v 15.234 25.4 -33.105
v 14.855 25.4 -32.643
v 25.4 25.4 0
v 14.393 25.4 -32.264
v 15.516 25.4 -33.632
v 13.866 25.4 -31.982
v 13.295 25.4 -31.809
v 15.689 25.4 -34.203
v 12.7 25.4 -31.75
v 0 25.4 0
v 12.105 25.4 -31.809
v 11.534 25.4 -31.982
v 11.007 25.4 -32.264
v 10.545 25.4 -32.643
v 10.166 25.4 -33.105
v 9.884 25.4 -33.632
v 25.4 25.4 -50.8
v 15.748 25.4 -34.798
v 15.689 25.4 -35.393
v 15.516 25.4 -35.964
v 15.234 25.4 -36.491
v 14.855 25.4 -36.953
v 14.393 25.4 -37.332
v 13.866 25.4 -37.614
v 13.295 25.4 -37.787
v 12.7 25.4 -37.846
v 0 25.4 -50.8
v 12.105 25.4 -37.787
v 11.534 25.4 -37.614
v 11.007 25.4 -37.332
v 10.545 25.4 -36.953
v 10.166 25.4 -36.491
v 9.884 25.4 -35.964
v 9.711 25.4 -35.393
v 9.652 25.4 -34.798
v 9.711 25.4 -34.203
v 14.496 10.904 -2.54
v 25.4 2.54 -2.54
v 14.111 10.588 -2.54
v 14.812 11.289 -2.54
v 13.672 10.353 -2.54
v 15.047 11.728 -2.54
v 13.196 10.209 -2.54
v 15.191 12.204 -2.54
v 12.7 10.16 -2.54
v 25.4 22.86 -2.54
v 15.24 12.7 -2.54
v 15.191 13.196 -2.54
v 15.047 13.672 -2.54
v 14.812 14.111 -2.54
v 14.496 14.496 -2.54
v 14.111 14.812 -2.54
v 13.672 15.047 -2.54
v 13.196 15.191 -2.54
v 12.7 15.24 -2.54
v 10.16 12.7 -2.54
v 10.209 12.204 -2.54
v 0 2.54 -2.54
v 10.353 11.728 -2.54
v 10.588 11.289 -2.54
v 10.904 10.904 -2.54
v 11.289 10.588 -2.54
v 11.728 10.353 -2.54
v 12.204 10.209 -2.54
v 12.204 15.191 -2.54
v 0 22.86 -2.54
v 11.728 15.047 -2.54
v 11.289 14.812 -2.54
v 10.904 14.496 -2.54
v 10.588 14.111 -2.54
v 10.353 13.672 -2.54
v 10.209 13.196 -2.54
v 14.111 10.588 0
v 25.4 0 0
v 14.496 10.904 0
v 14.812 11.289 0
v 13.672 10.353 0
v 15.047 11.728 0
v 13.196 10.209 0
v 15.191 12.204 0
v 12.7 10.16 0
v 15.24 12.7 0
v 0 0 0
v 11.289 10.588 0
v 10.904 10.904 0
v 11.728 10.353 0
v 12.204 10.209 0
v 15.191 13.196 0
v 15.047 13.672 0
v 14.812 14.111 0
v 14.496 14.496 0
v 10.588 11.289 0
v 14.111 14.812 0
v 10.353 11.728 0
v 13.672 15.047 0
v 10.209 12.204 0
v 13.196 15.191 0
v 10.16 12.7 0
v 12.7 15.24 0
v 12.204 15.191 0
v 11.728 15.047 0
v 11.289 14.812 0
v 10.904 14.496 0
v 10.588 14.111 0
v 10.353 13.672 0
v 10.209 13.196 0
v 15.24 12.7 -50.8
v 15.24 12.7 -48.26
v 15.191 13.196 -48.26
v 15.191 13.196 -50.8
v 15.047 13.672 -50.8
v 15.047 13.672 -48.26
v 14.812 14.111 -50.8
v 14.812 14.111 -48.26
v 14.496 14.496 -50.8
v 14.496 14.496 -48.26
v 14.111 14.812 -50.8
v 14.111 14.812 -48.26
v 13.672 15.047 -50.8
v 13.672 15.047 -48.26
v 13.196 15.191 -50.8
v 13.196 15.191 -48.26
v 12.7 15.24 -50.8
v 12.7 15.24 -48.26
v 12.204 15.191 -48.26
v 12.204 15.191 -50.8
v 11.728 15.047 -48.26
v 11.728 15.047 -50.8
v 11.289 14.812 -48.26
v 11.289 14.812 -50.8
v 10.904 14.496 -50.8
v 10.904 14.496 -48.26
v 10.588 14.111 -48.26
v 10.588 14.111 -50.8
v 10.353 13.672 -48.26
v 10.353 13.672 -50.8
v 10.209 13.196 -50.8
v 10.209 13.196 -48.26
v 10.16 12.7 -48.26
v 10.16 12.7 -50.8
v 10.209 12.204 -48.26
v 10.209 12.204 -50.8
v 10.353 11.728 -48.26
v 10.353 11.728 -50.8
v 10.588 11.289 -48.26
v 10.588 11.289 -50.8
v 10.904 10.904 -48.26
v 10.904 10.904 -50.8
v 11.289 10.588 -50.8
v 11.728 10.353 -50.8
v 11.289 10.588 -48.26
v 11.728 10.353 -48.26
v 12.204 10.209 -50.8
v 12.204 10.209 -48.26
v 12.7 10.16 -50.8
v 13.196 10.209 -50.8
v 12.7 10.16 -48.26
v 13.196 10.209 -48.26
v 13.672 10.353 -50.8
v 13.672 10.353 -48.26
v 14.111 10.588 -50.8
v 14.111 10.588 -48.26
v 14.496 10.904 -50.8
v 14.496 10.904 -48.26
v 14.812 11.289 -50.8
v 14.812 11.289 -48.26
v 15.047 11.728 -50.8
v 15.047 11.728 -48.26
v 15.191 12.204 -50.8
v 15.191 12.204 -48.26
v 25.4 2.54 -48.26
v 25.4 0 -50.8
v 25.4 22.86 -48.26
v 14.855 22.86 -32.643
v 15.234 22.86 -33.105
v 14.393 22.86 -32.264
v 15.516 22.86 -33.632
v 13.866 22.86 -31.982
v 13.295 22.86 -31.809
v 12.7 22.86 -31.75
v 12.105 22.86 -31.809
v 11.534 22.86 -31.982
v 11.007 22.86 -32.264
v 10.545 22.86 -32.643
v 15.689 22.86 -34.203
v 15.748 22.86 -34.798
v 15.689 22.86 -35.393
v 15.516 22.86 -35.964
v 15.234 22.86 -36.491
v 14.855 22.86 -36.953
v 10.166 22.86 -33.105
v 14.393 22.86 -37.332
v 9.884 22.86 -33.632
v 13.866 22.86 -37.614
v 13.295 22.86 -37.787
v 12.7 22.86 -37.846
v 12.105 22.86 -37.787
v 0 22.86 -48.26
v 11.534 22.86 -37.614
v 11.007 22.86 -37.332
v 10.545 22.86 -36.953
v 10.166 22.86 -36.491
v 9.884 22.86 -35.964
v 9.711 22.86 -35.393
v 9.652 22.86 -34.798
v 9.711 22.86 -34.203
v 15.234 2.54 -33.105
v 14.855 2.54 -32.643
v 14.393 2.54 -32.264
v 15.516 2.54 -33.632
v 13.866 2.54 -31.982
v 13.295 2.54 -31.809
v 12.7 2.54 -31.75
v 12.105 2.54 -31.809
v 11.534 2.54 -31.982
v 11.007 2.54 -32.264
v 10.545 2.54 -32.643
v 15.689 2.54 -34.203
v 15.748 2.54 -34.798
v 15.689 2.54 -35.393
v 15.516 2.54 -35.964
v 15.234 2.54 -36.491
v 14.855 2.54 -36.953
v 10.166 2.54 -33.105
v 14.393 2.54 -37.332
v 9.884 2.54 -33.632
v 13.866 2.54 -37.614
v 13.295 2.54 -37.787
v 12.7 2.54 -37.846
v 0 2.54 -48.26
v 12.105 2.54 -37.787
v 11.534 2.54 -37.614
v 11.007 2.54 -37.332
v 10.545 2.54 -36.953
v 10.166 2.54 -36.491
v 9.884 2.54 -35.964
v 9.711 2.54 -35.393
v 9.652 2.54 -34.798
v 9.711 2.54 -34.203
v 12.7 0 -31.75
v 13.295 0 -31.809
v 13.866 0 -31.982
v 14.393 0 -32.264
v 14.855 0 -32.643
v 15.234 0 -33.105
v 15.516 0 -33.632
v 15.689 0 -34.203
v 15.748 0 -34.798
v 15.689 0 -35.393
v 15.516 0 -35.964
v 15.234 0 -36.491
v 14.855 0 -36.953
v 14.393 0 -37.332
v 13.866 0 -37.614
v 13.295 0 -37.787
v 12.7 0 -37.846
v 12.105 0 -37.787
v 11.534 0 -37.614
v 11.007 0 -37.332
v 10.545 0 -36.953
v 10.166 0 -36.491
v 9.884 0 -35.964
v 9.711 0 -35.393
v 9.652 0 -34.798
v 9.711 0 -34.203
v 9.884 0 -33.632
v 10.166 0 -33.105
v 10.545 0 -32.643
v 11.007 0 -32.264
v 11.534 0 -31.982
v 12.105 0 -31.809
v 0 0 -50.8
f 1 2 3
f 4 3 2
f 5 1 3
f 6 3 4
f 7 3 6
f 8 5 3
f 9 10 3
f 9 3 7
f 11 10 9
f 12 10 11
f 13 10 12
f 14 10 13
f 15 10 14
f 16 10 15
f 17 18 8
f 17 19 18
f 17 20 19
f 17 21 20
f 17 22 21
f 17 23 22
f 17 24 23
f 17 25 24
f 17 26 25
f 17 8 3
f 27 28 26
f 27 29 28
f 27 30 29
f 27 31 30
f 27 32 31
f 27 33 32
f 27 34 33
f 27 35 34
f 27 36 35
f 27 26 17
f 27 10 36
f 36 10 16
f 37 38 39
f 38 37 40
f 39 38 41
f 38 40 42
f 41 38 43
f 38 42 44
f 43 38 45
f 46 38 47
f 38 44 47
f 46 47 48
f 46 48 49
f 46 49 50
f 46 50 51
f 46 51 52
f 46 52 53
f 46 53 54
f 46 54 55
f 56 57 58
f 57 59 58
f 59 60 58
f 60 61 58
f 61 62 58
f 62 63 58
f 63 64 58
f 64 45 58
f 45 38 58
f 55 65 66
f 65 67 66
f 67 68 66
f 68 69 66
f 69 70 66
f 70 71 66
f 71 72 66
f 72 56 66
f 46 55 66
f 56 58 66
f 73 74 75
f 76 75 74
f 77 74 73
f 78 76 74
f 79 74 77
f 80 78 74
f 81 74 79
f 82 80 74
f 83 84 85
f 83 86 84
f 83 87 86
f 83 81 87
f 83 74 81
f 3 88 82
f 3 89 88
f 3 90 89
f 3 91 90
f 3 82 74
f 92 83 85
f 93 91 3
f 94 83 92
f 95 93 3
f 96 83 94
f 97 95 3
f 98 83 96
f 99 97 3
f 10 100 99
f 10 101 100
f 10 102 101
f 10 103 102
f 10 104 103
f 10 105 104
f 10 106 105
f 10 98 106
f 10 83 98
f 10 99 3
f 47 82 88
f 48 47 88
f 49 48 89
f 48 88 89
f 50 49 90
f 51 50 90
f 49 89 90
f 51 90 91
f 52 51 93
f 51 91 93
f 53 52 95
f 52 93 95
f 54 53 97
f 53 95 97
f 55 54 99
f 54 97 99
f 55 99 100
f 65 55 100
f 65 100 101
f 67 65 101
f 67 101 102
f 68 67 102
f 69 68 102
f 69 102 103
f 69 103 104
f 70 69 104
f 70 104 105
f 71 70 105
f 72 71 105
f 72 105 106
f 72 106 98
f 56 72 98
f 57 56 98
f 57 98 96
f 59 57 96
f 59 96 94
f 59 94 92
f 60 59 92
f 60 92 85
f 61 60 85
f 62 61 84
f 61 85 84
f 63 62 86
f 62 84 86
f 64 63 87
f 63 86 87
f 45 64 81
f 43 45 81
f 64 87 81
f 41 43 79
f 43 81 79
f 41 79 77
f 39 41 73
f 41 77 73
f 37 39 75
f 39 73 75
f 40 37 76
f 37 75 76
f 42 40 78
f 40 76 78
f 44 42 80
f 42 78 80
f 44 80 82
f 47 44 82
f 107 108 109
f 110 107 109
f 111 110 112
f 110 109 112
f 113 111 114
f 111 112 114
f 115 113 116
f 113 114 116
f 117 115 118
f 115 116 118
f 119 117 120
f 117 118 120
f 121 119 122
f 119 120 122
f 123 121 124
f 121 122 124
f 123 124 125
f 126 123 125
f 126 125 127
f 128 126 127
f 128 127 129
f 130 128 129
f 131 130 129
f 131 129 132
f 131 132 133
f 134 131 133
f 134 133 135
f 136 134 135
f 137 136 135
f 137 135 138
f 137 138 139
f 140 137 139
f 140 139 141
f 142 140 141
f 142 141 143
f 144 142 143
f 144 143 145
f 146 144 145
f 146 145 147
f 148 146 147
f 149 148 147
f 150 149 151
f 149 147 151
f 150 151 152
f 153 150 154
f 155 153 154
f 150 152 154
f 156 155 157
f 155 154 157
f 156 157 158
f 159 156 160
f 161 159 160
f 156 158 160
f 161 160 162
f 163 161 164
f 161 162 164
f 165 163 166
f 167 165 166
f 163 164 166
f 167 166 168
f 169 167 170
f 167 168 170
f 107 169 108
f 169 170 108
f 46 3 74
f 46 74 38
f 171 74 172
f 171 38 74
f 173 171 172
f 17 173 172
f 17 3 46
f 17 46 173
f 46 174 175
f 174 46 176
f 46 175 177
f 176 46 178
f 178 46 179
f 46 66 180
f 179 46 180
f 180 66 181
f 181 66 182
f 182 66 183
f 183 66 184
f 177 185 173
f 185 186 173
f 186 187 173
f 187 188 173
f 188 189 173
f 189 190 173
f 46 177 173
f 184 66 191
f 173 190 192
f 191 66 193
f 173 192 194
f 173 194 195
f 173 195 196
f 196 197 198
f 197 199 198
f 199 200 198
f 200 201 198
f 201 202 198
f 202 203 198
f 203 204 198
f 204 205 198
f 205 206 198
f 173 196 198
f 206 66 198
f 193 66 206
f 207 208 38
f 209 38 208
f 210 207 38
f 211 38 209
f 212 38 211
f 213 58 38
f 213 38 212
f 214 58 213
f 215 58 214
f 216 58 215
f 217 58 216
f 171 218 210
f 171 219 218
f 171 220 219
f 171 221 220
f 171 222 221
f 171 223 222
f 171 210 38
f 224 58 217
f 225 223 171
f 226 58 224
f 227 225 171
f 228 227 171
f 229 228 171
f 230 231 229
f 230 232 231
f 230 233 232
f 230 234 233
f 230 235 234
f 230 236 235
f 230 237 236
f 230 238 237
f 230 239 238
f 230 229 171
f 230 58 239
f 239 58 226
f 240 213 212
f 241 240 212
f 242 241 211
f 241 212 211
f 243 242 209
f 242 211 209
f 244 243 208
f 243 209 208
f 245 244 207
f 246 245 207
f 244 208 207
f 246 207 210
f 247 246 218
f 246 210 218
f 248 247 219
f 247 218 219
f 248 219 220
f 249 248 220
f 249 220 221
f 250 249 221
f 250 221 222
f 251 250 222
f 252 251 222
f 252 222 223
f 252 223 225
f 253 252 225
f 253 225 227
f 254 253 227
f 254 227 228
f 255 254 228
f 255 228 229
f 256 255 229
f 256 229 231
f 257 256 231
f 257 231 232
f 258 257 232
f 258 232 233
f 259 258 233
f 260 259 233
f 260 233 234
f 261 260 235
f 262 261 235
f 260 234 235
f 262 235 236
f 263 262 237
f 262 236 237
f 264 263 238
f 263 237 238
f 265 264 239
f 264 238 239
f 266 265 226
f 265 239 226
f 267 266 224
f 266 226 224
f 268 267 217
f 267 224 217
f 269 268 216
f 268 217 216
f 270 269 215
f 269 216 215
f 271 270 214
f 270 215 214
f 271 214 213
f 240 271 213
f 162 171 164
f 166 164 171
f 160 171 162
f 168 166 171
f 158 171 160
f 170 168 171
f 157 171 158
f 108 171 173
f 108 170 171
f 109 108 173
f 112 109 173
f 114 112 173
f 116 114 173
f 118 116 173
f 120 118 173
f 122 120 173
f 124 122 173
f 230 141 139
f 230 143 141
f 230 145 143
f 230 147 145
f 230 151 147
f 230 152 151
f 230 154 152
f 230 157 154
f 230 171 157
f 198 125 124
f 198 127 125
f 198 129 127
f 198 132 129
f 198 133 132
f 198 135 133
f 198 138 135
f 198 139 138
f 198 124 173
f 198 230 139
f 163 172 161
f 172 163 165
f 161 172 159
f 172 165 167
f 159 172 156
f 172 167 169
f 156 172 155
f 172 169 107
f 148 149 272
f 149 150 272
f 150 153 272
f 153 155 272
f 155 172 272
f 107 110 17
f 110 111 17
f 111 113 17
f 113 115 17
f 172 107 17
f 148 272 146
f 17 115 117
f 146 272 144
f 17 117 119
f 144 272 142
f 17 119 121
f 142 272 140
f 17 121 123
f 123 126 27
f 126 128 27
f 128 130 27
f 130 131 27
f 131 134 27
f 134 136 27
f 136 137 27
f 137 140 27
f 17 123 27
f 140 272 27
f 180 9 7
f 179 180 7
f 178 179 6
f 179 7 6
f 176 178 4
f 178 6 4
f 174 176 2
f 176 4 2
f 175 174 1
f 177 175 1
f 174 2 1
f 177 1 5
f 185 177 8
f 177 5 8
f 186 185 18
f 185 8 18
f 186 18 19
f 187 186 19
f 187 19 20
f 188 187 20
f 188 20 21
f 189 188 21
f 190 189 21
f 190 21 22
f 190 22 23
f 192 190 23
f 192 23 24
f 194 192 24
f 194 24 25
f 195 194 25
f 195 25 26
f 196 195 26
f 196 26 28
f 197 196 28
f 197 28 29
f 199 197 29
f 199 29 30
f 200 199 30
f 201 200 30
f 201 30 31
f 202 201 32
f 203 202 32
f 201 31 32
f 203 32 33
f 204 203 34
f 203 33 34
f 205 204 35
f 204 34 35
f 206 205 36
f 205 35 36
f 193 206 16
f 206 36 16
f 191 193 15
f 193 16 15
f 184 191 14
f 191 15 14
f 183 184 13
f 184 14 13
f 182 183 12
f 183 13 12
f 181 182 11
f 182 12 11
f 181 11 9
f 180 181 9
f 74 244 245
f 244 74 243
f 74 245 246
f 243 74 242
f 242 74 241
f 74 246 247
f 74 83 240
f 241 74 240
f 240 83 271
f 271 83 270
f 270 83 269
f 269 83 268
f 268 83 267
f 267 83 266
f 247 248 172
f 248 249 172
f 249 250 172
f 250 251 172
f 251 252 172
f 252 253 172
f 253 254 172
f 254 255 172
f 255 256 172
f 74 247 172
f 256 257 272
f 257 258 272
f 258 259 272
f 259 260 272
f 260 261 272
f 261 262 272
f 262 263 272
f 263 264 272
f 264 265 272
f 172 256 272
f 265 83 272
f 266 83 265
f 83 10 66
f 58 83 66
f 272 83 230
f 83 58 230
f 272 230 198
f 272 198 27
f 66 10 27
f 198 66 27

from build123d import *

# Parameters (mm, degrees)
SKETCH1_W           = 50.8
SKETCH1_H           = 25.4
SKETCH1_W_2         = 45.72
SKETCH1_H_2         = 20.32
BOSS_EXTRUDE1_DEPTH = 25.4
SKETCH3_R           = 3.048
CUT_EXTRUDE1_DEPTH  = 63.217039467
SKETCH4_R           = 2.54
CUT_EXTRUDE2_DEPTH  = 63.217039467


with BuildPart() as part:
    # Sketch1 → Boss-Extrude1 (new body)
    with BuildSketch(Plane(origin=(0, 0, 0), x_dir=(0, 0, -1), z_dir=(1, 0, 0))):
        with Locations((25.4, 12.7)):
            Rectangle(SKETCH1_W, SKETCH1_H)
        with Locations((25.4, 12.7)):
            Rectangle(SKETCH1_W_2, SKETCH1_H_2, mode=Mode.SUBTRACT)
    extrude(amount=BOSS_EXTRUDE1_DEPTH)

    # Sketch3 → Cut-Extrude1 (cut, through all)
    with BuildSketch(Plane(origin=(0, 25.4, 0), x_dir=(1, 0, 0), z_dir=(0, 1, 0))):
        with Locations(Location((12.7, 34.798, 0), (0, 0, 270))):
            Circle(SKETCH3_R)
    extrude(amount=-CUT_EXTRUDE1_DEPTH, mode=Mode.SUBTRACT)

    # Sketch4 → Cut-Extrude2 (cut, through all)
    with BuildSketch(Plane.XY):
        with Locations((12.7, 12.7)):
            Circle(SKETCH4_R)
    extrude(amount=-CUT_EXTRUDE2_DEPTH, mode=Mode.SUBTRACT)


solid = part.part
